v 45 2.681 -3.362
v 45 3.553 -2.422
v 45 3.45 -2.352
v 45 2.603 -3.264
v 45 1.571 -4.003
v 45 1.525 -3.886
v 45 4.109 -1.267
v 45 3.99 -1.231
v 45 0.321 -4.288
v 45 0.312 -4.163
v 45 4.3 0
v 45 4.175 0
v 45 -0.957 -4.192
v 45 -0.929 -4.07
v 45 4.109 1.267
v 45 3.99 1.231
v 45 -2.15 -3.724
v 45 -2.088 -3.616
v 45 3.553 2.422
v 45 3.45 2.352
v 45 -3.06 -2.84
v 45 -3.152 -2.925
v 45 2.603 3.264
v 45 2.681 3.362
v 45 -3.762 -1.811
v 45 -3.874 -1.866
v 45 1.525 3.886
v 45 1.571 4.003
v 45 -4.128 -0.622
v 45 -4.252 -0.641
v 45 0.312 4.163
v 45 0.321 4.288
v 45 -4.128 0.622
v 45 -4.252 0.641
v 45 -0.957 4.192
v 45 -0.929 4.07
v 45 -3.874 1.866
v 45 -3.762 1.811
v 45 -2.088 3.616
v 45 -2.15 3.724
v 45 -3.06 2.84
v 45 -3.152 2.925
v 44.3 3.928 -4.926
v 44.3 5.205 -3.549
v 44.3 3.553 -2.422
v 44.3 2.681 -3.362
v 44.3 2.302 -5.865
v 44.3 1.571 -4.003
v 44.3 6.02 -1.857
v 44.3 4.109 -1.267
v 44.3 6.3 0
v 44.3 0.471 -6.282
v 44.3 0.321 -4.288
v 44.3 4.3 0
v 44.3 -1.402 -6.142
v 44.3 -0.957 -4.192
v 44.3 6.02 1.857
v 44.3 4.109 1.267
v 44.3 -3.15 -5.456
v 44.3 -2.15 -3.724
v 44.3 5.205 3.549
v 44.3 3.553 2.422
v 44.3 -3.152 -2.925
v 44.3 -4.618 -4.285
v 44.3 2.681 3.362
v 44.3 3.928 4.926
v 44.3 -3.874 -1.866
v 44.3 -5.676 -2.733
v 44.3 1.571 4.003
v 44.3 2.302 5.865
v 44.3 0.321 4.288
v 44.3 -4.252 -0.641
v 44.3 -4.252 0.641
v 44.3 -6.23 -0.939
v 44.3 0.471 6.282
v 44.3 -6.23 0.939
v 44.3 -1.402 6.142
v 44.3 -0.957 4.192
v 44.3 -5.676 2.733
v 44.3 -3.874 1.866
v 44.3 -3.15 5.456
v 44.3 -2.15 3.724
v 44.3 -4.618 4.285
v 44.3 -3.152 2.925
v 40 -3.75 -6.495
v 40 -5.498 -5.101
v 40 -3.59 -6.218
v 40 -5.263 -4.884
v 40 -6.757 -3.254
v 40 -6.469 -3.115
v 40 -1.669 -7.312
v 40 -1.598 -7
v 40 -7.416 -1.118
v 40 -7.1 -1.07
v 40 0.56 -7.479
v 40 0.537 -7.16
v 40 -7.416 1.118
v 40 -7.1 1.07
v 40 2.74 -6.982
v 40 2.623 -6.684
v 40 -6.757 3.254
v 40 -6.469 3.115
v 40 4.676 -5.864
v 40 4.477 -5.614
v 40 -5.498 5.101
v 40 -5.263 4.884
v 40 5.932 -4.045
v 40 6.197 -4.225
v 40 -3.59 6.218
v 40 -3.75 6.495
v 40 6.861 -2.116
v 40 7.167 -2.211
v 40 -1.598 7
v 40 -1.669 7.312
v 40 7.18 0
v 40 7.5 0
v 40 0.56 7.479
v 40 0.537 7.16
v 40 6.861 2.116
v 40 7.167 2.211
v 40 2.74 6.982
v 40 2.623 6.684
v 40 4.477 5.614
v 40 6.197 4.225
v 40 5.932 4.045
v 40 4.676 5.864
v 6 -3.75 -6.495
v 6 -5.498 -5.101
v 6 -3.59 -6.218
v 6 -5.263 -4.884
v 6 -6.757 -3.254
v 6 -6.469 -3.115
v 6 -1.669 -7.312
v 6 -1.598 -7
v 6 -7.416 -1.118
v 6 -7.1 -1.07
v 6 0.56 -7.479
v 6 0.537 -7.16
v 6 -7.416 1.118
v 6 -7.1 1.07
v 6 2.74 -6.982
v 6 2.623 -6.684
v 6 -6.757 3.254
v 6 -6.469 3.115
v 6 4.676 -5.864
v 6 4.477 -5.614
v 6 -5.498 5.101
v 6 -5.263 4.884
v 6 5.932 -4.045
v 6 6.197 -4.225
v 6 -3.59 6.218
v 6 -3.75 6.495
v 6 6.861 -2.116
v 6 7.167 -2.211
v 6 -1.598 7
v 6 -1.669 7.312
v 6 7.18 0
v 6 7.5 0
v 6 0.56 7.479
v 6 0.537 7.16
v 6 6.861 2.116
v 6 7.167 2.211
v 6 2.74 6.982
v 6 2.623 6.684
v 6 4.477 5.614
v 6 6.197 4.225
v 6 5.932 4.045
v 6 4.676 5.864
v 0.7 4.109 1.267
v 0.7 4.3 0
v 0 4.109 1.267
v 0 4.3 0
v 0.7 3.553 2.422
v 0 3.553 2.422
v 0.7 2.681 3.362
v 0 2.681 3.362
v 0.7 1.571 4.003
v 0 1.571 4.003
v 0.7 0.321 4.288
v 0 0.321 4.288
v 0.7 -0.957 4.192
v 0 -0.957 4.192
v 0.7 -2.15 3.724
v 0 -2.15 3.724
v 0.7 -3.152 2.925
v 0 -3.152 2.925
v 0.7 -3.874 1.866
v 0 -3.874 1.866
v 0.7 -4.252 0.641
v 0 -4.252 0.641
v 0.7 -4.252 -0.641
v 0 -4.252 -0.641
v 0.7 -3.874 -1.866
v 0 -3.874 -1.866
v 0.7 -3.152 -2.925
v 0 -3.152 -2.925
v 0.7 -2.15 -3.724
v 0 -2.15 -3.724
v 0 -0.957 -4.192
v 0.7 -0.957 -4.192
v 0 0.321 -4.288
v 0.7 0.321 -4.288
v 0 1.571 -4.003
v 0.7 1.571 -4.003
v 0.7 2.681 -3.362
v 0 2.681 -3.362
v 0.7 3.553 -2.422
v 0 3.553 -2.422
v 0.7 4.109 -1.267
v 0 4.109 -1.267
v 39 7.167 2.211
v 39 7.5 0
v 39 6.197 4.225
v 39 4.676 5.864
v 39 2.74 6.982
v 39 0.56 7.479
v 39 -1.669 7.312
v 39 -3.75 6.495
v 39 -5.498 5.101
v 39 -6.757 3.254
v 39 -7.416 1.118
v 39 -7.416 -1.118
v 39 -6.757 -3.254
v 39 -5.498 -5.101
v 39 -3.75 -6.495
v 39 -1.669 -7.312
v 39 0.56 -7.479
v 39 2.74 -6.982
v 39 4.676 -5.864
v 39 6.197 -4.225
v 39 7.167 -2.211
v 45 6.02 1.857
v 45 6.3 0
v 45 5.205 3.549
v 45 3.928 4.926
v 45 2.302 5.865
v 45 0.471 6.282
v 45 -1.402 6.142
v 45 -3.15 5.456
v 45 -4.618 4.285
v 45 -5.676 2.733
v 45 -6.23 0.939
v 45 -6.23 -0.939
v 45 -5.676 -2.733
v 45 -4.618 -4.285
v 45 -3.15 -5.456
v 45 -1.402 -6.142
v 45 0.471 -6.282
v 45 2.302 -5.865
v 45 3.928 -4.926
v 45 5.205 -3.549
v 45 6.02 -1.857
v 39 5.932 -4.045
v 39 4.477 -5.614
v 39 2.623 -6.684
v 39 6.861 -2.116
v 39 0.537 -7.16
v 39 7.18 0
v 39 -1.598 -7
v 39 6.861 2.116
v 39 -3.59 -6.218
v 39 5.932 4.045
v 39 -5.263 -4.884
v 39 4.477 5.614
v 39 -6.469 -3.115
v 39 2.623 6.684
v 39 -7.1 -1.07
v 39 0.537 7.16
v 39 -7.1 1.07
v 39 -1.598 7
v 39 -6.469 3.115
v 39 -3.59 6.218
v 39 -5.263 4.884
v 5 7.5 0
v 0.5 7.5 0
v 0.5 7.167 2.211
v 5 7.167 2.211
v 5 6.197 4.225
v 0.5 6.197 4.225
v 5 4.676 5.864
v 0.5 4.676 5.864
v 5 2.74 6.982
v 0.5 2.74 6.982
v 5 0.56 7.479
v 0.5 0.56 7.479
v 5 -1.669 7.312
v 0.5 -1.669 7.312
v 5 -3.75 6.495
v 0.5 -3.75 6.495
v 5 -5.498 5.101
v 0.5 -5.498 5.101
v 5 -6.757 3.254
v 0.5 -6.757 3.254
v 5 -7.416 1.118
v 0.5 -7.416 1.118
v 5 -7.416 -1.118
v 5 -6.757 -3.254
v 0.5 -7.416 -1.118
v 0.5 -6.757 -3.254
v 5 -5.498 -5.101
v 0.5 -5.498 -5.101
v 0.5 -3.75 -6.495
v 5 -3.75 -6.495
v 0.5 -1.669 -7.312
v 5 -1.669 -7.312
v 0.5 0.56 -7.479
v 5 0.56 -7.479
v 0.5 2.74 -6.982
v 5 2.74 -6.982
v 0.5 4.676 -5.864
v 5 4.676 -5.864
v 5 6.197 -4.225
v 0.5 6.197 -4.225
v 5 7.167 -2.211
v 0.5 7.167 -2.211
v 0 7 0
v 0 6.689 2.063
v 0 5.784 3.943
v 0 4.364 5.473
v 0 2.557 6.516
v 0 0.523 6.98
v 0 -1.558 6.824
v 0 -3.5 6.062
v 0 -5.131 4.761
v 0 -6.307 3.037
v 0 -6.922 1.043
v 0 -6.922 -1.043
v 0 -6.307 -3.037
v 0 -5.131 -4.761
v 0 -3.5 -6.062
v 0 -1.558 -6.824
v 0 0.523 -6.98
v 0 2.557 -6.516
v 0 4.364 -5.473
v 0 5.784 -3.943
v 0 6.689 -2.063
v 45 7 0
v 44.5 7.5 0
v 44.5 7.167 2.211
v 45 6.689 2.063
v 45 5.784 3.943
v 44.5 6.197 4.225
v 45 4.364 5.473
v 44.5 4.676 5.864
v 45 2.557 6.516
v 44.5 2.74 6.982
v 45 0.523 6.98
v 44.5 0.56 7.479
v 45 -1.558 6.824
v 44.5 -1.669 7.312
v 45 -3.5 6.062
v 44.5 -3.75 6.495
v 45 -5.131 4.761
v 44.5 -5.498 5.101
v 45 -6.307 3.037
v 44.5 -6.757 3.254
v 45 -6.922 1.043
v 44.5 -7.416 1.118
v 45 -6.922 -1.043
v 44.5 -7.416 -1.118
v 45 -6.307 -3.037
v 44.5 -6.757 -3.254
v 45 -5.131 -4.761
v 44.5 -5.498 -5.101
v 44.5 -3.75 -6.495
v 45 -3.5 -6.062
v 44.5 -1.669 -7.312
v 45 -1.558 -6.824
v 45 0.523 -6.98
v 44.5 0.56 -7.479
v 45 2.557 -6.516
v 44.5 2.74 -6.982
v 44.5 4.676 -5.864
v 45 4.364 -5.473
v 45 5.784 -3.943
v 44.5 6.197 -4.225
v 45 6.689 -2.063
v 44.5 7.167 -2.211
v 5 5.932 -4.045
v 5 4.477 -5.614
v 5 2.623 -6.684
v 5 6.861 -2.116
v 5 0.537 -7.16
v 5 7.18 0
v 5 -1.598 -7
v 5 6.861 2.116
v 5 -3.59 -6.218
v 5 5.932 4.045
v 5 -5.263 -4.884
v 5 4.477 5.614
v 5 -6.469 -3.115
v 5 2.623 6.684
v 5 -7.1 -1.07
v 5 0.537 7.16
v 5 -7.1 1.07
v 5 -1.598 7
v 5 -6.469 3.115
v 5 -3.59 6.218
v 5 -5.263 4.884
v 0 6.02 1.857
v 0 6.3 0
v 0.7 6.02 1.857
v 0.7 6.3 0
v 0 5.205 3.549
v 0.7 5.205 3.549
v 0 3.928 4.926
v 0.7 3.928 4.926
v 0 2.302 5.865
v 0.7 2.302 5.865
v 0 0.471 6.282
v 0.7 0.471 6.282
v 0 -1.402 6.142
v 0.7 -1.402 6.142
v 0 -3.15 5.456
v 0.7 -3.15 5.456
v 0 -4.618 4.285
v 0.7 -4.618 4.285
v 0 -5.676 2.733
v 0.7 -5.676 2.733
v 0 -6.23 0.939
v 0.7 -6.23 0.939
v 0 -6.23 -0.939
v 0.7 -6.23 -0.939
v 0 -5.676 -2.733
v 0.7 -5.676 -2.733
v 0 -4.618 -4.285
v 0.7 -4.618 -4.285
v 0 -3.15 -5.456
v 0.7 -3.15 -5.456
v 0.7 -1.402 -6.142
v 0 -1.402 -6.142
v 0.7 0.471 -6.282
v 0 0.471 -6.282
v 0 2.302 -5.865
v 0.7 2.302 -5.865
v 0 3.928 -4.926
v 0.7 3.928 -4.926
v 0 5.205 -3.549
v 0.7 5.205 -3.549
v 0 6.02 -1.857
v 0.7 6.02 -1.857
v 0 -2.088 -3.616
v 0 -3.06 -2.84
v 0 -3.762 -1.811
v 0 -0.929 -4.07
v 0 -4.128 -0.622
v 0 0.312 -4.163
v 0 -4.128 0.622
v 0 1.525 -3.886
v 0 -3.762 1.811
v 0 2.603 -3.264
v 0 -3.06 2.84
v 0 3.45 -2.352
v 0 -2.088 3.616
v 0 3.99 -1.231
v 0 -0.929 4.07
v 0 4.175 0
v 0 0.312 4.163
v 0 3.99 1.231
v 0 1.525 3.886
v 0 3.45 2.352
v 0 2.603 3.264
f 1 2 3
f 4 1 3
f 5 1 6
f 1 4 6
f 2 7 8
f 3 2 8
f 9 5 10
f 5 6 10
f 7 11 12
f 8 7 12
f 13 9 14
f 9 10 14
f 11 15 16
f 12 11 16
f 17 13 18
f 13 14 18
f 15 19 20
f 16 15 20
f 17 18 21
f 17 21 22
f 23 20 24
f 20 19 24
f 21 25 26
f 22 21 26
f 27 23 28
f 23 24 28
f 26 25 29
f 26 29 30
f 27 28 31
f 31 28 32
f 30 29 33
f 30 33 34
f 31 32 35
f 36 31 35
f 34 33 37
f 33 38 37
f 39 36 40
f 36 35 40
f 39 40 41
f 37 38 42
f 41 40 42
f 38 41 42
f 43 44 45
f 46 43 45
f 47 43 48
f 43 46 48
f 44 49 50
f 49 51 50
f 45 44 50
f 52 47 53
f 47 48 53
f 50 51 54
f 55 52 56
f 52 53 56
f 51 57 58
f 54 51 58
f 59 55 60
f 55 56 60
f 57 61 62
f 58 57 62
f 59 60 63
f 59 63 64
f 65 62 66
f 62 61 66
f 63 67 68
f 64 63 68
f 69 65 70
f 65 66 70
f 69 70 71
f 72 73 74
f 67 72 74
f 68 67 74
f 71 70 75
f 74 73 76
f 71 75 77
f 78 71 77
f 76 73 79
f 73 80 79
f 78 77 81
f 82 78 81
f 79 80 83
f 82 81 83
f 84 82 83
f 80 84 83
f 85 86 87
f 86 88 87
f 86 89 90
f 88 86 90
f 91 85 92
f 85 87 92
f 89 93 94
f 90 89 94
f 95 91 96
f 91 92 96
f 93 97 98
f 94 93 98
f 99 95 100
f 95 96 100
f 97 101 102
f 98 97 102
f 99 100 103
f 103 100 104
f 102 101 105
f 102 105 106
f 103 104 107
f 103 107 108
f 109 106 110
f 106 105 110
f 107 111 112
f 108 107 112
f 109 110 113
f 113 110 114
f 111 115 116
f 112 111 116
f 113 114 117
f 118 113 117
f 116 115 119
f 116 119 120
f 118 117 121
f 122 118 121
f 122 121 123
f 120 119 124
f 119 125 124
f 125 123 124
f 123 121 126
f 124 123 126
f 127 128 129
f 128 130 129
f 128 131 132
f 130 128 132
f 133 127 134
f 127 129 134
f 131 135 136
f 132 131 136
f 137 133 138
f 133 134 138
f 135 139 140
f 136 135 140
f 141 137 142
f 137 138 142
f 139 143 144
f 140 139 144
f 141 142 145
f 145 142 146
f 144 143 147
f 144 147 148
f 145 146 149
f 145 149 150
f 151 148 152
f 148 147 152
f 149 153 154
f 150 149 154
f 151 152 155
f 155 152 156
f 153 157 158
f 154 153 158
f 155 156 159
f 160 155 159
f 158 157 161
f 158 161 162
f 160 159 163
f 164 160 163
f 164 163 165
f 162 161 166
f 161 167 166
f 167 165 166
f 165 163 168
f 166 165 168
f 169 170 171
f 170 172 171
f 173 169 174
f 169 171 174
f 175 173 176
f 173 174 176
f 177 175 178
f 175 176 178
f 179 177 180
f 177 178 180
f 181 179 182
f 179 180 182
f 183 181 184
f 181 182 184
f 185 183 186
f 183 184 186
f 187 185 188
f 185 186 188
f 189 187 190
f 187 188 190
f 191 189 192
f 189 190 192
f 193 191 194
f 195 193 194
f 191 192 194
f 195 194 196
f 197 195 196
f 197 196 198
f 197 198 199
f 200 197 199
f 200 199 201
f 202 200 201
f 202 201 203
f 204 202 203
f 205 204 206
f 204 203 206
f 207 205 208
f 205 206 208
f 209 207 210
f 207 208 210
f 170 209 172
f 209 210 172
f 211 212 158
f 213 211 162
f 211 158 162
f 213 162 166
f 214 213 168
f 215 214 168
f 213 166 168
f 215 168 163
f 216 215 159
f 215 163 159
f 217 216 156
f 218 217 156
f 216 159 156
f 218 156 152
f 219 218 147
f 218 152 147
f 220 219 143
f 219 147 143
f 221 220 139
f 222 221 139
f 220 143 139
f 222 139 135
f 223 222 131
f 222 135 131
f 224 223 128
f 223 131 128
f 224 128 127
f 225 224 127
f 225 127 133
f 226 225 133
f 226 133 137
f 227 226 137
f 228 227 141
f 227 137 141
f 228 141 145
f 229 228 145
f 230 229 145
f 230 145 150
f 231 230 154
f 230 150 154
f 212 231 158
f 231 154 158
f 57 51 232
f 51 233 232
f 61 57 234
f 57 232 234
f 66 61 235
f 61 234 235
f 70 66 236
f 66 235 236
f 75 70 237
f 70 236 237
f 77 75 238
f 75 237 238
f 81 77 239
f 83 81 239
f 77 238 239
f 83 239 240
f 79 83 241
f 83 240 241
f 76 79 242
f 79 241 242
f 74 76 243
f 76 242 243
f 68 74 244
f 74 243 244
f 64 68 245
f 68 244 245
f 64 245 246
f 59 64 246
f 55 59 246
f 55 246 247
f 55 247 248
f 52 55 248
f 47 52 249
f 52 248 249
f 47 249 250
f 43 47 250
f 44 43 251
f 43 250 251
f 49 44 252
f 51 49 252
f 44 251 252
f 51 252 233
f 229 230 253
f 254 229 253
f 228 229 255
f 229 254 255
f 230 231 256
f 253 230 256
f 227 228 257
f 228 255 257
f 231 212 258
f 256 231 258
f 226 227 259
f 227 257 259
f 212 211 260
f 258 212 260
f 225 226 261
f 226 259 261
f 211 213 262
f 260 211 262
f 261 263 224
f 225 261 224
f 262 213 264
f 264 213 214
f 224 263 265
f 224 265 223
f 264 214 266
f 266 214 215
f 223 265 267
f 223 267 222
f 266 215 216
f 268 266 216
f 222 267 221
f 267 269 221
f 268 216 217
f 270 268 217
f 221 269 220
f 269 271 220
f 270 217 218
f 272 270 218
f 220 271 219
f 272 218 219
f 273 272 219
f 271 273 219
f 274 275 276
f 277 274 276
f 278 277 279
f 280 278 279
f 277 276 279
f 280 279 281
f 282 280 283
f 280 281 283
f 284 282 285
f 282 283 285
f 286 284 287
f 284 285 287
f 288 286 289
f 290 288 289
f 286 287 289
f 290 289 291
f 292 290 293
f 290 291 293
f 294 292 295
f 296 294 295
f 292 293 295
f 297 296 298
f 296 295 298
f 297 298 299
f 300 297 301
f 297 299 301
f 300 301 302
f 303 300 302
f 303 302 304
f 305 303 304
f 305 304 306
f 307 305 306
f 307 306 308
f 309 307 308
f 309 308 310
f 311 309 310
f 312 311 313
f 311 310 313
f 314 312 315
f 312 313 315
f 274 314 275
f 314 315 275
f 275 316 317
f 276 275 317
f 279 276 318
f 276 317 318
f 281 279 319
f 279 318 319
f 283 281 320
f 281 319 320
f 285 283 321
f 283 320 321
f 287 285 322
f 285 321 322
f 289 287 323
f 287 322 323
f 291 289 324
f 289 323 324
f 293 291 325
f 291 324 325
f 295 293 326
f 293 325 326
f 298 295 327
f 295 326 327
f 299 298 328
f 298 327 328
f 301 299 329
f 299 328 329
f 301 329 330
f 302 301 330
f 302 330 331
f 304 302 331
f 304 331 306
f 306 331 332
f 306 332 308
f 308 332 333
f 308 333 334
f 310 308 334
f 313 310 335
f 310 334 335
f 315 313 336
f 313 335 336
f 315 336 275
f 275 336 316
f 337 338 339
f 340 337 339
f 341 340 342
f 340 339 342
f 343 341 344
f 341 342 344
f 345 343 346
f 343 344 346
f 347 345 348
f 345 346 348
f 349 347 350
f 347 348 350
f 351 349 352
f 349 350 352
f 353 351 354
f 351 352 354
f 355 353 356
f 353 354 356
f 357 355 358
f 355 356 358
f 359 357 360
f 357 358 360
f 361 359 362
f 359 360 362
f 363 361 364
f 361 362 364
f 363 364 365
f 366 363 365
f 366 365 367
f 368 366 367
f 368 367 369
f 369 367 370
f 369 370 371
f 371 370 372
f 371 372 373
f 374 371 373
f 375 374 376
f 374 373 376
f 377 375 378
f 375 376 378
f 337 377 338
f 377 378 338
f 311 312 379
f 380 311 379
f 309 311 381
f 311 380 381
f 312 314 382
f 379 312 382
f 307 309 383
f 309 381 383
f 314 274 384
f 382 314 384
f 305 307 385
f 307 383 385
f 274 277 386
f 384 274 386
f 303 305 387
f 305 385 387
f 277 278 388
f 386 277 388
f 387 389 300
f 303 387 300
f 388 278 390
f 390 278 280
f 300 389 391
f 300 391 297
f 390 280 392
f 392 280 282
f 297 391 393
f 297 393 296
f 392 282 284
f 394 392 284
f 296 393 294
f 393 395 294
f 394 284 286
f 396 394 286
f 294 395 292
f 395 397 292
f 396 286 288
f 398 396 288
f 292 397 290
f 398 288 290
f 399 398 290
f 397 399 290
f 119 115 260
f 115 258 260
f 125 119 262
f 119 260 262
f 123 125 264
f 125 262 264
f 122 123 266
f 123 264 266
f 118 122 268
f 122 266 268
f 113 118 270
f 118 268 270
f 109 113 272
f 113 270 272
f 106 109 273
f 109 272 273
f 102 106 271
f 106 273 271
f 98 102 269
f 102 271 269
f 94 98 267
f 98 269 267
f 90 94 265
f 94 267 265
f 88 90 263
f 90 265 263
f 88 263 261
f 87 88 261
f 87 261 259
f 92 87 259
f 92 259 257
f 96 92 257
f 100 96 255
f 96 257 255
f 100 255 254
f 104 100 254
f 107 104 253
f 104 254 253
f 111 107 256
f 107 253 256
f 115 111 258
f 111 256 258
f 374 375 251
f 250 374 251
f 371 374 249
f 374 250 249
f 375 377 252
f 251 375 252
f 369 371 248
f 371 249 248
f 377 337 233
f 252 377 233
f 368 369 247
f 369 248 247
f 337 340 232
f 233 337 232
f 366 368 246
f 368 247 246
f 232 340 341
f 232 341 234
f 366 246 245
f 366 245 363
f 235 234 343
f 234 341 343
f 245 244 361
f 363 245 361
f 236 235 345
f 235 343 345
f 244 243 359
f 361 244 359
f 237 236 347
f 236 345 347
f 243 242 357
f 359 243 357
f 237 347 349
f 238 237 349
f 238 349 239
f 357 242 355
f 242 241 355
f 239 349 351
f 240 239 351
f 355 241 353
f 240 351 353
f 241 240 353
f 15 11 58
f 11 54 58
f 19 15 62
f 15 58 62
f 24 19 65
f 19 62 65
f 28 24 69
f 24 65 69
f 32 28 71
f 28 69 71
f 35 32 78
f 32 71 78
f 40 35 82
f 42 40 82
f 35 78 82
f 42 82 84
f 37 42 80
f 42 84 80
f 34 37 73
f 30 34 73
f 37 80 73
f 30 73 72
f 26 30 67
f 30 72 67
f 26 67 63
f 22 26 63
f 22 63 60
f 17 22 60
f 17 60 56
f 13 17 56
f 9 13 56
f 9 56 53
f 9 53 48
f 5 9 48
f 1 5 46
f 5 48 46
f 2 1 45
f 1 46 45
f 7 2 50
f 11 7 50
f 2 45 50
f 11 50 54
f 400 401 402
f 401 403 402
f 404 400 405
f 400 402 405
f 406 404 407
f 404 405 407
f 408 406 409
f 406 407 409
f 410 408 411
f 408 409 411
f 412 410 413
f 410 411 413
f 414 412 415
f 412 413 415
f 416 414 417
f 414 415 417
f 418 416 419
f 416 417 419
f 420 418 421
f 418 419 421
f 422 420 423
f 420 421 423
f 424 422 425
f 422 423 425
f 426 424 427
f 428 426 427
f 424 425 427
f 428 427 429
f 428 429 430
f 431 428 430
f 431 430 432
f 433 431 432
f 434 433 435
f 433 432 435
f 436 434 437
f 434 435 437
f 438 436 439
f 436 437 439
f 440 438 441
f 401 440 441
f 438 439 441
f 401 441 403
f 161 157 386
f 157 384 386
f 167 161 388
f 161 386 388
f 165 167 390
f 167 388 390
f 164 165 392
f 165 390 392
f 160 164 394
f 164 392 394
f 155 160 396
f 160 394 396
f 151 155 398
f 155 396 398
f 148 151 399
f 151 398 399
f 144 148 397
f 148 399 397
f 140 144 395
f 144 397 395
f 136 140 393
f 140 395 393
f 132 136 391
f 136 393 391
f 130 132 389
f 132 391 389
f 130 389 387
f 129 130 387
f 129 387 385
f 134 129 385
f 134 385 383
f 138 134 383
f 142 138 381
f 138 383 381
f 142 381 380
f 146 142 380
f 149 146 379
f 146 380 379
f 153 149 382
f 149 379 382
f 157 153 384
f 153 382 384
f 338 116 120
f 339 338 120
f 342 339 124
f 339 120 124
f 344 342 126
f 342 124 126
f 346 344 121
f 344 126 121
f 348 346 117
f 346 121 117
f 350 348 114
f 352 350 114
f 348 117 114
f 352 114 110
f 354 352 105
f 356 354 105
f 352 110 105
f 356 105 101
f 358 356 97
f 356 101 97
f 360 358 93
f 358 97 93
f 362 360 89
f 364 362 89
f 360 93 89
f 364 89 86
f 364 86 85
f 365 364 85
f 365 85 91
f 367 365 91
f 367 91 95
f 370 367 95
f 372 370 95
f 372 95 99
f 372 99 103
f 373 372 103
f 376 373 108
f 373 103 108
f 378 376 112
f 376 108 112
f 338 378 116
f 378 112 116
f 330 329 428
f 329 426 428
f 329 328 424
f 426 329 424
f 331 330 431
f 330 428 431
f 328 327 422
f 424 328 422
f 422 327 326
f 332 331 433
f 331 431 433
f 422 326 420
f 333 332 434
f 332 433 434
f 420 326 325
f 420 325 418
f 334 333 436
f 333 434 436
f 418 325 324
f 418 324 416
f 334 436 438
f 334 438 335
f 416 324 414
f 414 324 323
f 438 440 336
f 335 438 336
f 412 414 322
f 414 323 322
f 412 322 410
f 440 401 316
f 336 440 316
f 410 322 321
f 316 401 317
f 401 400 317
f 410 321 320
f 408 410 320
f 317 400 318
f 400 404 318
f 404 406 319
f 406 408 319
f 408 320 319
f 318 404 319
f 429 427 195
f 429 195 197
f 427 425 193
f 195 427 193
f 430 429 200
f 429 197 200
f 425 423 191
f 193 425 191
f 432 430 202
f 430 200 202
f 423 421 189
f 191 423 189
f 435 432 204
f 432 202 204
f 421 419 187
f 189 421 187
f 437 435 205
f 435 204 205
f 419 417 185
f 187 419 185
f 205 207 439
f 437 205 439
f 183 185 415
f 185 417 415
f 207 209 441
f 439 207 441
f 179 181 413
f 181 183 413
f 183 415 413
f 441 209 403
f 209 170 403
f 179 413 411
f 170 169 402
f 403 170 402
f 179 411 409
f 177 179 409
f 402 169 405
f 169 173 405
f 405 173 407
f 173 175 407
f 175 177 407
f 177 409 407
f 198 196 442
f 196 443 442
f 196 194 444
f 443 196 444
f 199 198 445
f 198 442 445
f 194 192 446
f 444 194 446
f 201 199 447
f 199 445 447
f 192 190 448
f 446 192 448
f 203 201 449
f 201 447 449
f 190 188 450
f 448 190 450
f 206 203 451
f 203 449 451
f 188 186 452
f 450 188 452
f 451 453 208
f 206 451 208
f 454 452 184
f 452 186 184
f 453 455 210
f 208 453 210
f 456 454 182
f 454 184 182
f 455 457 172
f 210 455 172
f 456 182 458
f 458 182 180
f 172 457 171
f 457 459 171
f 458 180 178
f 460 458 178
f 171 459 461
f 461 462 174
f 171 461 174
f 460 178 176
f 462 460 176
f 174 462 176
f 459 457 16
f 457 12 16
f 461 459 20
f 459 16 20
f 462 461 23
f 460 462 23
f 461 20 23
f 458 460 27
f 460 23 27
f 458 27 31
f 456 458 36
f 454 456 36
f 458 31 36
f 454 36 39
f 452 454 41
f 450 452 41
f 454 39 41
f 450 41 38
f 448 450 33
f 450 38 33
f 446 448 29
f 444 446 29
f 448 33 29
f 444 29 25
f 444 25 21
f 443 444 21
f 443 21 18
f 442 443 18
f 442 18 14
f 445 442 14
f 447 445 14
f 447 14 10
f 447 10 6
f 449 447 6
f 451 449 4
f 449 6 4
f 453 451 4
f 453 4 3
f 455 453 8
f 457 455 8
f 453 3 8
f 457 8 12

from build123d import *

# Parameters (mm, degrees)
ZKOSEN_1_SIZE = 0.5


with BuildPart() as part:
    # Skica1 → Rotovat1 (revolve)
    with BuildSketch(Plane.XY):
        Polygon((0, 4.3), (0, 4.175), (45, 4.175), (45, 4.3), (44.3, 4.3), (44.3, 6.3), (45, 6.3), (45, 7.5), (40, 7.5), (40, 7.18), (39, 7.18), (39, 7.5), (6, 7.5), (6, 7.18), (5, 7.18), (5, 7.5), (0, 7.5), (0, 6.3), (0.7, 6.3), (0.7, 4.3), align=None)
    revolve(axis=Axis((0, 0, 0), (1, 0, 0)))

    # Zkosení1
    zkosen_1_edges = [part.edges().sort_by_distance(p)[0] for p in [
        (0, -7.5, 0),
        (45, -7.5, 0),
    ]]
    chamfer(zkosen_1_edges, length=ZKOSEN_1_SIZE)


solid = part.part
